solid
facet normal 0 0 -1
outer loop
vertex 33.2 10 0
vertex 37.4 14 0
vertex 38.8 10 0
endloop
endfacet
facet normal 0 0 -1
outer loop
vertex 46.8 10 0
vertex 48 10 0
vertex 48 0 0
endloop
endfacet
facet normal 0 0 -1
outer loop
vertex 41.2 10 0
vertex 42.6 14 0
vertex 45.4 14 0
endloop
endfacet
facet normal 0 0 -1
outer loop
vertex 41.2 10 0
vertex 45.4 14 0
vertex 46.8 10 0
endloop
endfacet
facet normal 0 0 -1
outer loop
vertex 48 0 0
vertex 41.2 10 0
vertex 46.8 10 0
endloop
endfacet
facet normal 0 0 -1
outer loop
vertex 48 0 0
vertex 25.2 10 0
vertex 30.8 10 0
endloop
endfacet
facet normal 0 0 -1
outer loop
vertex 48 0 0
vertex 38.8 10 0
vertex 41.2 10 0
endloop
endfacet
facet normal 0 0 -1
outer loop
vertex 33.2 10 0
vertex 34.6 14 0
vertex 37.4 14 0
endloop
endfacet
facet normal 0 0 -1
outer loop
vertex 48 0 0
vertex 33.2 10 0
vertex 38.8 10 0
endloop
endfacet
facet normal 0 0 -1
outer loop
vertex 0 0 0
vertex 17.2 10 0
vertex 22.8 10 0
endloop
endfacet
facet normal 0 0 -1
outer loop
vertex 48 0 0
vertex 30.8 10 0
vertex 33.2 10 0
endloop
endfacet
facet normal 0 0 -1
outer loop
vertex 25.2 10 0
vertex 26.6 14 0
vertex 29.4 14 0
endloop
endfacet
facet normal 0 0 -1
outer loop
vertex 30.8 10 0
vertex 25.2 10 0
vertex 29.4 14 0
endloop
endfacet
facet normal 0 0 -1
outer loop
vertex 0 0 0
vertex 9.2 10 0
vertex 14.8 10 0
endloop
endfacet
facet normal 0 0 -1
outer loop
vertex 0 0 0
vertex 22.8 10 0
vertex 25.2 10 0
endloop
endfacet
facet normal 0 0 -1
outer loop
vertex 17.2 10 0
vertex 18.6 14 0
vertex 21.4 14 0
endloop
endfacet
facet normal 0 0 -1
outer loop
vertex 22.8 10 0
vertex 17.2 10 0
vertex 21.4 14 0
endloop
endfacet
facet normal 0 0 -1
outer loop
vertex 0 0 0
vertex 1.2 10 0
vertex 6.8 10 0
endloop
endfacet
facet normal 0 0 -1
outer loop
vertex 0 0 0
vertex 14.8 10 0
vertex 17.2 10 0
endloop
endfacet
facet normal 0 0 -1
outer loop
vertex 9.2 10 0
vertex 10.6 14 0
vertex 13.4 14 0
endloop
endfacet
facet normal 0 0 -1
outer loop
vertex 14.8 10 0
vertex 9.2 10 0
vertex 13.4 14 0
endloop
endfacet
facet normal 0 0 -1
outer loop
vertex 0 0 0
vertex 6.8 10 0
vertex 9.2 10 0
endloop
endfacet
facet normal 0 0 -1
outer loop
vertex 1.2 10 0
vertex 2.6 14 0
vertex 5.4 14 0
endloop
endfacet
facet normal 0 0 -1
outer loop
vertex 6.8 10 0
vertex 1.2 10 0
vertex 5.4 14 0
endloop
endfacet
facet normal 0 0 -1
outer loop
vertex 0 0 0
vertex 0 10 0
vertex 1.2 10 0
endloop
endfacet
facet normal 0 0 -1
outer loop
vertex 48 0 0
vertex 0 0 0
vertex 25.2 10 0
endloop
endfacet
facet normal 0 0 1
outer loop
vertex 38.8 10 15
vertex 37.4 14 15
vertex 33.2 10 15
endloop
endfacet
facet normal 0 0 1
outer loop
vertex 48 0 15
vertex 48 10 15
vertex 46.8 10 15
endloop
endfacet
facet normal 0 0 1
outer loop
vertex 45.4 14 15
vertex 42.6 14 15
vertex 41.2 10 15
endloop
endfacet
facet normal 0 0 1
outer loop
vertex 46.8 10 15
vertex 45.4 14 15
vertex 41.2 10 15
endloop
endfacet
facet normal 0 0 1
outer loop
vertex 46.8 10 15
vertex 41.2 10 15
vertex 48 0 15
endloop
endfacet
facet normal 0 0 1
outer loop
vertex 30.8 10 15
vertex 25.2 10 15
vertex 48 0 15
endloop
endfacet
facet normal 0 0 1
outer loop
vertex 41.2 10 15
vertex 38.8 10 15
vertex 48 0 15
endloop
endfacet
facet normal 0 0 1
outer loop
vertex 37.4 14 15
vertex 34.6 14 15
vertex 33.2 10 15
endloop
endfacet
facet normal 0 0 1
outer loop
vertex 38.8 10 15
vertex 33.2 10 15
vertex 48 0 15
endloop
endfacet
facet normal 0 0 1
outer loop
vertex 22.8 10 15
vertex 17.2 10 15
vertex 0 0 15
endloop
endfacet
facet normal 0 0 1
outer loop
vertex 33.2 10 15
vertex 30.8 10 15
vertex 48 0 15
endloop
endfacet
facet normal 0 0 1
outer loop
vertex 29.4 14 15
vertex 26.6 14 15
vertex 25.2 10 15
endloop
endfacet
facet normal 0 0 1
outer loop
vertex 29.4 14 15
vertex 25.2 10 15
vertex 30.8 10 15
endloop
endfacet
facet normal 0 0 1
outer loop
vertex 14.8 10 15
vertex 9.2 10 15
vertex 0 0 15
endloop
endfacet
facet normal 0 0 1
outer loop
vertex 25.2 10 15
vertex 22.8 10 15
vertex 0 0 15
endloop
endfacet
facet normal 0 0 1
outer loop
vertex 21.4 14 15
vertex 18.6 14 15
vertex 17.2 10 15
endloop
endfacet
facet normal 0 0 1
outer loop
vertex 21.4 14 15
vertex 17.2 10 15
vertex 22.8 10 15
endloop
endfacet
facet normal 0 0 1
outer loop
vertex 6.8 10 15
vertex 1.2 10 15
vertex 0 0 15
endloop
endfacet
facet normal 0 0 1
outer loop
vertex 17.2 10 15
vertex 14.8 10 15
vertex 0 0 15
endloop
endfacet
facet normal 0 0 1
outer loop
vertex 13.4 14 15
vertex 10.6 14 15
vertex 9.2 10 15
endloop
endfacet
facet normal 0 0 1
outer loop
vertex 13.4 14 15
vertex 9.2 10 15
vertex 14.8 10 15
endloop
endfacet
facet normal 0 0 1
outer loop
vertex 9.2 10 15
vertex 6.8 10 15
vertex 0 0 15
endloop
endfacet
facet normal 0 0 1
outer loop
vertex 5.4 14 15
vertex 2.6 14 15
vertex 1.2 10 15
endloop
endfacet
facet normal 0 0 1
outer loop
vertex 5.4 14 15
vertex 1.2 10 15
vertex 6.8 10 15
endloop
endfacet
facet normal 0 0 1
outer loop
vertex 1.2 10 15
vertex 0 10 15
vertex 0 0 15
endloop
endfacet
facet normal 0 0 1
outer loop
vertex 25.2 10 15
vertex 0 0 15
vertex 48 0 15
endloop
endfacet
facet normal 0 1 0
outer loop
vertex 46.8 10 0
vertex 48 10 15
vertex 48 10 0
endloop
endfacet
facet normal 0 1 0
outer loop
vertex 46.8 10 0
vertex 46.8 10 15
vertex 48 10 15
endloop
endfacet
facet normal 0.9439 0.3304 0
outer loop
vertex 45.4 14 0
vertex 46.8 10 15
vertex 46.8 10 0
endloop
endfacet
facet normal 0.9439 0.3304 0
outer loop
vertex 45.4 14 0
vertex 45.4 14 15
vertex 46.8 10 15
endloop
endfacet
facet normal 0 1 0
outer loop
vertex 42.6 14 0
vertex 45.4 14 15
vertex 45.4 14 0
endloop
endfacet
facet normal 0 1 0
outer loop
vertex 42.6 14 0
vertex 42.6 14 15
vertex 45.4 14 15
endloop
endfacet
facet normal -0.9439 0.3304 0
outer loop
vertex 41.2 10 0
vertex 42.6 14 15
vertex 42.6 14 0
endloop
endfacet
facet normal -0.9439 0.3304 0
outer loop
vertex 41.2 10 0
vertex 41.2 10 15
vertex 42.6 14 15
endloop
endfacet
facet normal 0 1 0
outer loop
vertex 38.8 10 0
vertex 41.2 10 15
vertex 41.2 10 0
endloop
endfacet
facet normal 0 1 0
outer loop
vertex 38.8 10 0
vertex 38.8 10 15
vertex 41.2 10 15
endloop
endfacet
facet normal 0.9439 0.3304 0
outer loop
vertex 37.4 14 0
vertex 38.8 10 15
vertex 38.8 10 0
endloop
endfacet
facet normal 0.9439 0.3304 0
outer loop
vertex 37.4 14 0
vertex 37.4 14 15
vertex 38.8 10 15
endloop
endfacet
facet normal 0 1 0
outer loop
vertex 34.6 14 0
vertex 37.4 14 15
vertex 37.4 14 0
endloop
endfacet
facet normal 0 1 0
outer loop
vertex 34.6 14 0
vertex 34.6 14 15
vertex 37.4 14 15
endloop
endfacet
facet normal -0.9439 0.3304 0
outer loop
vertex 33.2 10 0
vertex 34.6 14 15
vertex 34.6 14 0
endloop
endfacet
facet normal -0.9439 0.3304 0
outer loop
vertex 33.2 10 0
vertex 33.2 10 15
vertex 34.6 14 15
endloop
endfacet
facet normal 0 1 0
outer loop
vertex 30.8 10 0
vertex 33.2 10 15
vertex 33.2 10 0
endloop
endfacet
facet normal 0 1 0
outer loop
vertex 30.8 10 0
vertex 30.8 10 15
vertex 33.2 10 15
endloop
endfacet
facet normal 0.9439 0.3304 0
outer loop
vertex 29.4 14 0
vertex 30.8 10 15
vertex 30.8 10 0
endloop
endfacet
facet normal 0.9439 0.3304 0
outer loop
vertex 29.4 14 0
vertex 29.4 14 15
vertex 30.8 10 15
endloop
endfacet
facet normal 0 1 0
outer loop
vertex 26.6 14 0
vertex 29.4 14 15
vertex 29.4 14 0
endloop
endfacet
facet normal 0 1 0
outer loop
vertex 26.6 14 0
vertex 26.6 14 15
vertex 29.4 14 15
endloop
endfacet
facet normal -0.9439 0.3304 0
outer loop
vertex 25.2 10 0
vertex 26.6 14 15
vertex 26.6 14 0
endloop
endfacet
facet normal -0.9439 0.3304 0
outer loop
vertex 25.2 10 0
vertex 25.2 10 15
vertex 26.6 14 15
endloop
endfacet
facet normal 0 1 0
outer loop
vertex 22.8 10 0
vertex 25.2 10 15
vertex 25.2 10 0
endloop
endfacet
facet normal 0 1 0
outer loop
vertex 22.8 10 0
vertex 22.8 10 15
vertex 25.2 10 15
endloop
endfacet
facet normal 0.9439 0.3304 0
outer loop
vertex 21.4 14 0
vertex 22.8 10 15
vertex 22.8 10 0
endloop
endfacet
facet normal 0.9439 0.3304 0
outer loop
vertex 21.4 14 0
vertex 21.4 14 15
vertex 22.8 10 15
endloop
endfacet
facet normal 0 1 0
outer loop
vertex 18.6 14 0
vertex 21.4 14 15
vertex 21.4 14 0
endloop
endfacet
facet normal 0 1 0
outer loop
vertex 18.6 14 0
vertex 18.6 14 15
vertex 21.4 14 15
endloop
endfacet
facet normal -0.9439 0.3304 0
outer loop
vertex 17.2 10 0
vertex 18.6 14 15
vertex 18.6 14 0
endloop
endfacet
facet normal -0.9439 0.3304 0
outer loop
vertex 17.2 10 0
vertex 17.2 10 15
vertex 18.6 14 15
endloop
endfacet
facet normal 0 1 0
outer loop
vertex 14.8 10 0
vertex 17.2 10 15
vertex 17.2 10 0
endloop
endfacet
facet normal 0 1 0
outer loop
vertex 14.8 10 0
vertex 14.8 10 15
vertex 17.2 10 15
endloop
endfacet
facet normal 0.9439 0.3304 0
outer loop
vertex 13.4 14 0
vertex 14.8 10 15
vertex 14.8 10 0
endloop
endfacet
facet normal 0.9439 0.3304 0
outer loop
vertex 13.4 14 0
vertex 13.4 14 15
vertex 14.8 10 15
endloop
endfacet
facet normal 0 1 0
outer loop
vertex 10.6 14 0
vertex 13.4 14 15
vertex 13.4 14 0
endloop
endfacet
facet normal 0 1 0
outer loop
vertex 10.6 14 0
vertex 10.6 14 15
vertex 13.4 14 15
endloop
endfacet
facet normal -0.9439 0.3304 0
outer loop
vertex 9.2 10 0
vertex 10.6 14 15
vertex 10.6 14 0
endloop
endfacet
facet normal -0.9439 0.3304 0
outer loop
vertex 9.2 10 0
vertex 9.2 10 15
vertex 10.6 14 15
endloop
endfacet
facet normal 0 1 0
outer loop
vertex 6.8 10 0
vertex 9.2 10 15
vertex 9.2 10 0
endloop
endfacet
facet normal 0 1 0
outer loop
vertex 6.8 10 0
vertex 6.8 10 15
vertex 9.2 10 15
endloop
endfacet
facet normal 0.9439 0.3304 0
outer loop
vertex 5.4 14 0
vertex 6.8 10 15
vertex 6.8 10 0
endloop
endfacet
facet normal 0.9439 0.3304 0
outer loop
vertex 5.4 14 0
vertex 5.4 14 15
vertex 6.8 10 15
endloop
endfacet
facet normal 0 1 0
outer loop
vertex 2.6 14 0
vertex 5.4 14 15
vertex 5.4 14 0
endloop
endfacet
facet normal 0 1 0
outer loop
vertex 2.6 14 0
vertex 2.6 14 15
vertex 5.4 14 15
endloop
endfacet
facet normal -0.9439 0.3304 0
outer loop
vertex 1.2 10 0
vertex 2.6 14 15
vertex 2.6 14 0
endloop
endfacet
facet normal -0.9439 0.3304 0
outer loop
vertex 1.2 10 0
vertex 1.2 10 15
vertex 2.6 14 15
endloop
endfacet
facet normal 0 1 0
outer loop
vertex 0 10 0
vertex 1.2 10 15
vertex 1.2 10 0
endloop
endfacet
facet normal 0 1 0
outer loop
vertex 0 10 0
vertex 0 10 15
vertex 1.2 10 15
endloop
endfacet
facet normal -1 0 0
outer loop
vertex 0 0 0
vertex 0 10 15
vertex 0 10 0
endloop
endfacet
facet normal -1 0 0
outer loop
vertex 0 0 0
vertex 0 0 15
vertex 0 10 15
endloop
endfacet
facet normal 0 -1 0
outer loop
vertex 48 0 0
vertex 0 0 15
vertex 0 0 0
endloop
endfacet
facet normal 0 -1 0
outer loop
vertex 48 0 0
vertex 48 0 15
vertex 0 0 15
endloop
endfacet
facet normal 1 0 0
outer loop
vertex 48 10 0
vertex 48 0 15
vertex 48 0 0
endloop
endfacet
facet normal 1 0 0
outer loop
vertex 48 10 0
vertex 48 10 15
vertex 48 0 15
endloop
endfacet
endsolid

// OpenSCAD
$fn = 32;

// ----------------------------------------------------------------------
// Gear rack: 6 teeth, pitch 8 mm
// ----------------------------------------------------------------------

// --- parameters (mm) ---
teeth = 6;                // number of teeth
pitch = 8;                // tooth pitch, X
root_w = 5.6;             // tooth width at the root
tip_w = 2.8;              // tooth width at the tip
base_h = 10;              // rack body height, Y
tooth_h = 4;              // tooth height above the body
plate_t = 15;             // rack width, Z (extrusion height)

rack_l = teeth * pitch;  // overall length
total_h = base_h + tooth_h;  // overall height

profile = [[0, 0], [48, 0], [48, 10], [46.8, 10], [45.4, 14], [42.6, 14], [41.2, 10], [38.8, 10], [37.4, 14], [34.6, 14], [33.2, 10], [30.8, 10], [29.4, 14], [26.6, 14], [25.2, 10], [22.8, 10], [21.4, 14], [18.6, 14], [17.2, 10], [14.8, 10], [13.4, 14], [10.6, 14], [9.2, 10], [6.8, 10], [5.4, 14], [2.6, 14], [1.2, 10], [0, 10]];  // primary outline, 28 points, counter clockwise

// --- the one profile operation ---
linear_extrude(height = plate_t) polygon(points = profile);
